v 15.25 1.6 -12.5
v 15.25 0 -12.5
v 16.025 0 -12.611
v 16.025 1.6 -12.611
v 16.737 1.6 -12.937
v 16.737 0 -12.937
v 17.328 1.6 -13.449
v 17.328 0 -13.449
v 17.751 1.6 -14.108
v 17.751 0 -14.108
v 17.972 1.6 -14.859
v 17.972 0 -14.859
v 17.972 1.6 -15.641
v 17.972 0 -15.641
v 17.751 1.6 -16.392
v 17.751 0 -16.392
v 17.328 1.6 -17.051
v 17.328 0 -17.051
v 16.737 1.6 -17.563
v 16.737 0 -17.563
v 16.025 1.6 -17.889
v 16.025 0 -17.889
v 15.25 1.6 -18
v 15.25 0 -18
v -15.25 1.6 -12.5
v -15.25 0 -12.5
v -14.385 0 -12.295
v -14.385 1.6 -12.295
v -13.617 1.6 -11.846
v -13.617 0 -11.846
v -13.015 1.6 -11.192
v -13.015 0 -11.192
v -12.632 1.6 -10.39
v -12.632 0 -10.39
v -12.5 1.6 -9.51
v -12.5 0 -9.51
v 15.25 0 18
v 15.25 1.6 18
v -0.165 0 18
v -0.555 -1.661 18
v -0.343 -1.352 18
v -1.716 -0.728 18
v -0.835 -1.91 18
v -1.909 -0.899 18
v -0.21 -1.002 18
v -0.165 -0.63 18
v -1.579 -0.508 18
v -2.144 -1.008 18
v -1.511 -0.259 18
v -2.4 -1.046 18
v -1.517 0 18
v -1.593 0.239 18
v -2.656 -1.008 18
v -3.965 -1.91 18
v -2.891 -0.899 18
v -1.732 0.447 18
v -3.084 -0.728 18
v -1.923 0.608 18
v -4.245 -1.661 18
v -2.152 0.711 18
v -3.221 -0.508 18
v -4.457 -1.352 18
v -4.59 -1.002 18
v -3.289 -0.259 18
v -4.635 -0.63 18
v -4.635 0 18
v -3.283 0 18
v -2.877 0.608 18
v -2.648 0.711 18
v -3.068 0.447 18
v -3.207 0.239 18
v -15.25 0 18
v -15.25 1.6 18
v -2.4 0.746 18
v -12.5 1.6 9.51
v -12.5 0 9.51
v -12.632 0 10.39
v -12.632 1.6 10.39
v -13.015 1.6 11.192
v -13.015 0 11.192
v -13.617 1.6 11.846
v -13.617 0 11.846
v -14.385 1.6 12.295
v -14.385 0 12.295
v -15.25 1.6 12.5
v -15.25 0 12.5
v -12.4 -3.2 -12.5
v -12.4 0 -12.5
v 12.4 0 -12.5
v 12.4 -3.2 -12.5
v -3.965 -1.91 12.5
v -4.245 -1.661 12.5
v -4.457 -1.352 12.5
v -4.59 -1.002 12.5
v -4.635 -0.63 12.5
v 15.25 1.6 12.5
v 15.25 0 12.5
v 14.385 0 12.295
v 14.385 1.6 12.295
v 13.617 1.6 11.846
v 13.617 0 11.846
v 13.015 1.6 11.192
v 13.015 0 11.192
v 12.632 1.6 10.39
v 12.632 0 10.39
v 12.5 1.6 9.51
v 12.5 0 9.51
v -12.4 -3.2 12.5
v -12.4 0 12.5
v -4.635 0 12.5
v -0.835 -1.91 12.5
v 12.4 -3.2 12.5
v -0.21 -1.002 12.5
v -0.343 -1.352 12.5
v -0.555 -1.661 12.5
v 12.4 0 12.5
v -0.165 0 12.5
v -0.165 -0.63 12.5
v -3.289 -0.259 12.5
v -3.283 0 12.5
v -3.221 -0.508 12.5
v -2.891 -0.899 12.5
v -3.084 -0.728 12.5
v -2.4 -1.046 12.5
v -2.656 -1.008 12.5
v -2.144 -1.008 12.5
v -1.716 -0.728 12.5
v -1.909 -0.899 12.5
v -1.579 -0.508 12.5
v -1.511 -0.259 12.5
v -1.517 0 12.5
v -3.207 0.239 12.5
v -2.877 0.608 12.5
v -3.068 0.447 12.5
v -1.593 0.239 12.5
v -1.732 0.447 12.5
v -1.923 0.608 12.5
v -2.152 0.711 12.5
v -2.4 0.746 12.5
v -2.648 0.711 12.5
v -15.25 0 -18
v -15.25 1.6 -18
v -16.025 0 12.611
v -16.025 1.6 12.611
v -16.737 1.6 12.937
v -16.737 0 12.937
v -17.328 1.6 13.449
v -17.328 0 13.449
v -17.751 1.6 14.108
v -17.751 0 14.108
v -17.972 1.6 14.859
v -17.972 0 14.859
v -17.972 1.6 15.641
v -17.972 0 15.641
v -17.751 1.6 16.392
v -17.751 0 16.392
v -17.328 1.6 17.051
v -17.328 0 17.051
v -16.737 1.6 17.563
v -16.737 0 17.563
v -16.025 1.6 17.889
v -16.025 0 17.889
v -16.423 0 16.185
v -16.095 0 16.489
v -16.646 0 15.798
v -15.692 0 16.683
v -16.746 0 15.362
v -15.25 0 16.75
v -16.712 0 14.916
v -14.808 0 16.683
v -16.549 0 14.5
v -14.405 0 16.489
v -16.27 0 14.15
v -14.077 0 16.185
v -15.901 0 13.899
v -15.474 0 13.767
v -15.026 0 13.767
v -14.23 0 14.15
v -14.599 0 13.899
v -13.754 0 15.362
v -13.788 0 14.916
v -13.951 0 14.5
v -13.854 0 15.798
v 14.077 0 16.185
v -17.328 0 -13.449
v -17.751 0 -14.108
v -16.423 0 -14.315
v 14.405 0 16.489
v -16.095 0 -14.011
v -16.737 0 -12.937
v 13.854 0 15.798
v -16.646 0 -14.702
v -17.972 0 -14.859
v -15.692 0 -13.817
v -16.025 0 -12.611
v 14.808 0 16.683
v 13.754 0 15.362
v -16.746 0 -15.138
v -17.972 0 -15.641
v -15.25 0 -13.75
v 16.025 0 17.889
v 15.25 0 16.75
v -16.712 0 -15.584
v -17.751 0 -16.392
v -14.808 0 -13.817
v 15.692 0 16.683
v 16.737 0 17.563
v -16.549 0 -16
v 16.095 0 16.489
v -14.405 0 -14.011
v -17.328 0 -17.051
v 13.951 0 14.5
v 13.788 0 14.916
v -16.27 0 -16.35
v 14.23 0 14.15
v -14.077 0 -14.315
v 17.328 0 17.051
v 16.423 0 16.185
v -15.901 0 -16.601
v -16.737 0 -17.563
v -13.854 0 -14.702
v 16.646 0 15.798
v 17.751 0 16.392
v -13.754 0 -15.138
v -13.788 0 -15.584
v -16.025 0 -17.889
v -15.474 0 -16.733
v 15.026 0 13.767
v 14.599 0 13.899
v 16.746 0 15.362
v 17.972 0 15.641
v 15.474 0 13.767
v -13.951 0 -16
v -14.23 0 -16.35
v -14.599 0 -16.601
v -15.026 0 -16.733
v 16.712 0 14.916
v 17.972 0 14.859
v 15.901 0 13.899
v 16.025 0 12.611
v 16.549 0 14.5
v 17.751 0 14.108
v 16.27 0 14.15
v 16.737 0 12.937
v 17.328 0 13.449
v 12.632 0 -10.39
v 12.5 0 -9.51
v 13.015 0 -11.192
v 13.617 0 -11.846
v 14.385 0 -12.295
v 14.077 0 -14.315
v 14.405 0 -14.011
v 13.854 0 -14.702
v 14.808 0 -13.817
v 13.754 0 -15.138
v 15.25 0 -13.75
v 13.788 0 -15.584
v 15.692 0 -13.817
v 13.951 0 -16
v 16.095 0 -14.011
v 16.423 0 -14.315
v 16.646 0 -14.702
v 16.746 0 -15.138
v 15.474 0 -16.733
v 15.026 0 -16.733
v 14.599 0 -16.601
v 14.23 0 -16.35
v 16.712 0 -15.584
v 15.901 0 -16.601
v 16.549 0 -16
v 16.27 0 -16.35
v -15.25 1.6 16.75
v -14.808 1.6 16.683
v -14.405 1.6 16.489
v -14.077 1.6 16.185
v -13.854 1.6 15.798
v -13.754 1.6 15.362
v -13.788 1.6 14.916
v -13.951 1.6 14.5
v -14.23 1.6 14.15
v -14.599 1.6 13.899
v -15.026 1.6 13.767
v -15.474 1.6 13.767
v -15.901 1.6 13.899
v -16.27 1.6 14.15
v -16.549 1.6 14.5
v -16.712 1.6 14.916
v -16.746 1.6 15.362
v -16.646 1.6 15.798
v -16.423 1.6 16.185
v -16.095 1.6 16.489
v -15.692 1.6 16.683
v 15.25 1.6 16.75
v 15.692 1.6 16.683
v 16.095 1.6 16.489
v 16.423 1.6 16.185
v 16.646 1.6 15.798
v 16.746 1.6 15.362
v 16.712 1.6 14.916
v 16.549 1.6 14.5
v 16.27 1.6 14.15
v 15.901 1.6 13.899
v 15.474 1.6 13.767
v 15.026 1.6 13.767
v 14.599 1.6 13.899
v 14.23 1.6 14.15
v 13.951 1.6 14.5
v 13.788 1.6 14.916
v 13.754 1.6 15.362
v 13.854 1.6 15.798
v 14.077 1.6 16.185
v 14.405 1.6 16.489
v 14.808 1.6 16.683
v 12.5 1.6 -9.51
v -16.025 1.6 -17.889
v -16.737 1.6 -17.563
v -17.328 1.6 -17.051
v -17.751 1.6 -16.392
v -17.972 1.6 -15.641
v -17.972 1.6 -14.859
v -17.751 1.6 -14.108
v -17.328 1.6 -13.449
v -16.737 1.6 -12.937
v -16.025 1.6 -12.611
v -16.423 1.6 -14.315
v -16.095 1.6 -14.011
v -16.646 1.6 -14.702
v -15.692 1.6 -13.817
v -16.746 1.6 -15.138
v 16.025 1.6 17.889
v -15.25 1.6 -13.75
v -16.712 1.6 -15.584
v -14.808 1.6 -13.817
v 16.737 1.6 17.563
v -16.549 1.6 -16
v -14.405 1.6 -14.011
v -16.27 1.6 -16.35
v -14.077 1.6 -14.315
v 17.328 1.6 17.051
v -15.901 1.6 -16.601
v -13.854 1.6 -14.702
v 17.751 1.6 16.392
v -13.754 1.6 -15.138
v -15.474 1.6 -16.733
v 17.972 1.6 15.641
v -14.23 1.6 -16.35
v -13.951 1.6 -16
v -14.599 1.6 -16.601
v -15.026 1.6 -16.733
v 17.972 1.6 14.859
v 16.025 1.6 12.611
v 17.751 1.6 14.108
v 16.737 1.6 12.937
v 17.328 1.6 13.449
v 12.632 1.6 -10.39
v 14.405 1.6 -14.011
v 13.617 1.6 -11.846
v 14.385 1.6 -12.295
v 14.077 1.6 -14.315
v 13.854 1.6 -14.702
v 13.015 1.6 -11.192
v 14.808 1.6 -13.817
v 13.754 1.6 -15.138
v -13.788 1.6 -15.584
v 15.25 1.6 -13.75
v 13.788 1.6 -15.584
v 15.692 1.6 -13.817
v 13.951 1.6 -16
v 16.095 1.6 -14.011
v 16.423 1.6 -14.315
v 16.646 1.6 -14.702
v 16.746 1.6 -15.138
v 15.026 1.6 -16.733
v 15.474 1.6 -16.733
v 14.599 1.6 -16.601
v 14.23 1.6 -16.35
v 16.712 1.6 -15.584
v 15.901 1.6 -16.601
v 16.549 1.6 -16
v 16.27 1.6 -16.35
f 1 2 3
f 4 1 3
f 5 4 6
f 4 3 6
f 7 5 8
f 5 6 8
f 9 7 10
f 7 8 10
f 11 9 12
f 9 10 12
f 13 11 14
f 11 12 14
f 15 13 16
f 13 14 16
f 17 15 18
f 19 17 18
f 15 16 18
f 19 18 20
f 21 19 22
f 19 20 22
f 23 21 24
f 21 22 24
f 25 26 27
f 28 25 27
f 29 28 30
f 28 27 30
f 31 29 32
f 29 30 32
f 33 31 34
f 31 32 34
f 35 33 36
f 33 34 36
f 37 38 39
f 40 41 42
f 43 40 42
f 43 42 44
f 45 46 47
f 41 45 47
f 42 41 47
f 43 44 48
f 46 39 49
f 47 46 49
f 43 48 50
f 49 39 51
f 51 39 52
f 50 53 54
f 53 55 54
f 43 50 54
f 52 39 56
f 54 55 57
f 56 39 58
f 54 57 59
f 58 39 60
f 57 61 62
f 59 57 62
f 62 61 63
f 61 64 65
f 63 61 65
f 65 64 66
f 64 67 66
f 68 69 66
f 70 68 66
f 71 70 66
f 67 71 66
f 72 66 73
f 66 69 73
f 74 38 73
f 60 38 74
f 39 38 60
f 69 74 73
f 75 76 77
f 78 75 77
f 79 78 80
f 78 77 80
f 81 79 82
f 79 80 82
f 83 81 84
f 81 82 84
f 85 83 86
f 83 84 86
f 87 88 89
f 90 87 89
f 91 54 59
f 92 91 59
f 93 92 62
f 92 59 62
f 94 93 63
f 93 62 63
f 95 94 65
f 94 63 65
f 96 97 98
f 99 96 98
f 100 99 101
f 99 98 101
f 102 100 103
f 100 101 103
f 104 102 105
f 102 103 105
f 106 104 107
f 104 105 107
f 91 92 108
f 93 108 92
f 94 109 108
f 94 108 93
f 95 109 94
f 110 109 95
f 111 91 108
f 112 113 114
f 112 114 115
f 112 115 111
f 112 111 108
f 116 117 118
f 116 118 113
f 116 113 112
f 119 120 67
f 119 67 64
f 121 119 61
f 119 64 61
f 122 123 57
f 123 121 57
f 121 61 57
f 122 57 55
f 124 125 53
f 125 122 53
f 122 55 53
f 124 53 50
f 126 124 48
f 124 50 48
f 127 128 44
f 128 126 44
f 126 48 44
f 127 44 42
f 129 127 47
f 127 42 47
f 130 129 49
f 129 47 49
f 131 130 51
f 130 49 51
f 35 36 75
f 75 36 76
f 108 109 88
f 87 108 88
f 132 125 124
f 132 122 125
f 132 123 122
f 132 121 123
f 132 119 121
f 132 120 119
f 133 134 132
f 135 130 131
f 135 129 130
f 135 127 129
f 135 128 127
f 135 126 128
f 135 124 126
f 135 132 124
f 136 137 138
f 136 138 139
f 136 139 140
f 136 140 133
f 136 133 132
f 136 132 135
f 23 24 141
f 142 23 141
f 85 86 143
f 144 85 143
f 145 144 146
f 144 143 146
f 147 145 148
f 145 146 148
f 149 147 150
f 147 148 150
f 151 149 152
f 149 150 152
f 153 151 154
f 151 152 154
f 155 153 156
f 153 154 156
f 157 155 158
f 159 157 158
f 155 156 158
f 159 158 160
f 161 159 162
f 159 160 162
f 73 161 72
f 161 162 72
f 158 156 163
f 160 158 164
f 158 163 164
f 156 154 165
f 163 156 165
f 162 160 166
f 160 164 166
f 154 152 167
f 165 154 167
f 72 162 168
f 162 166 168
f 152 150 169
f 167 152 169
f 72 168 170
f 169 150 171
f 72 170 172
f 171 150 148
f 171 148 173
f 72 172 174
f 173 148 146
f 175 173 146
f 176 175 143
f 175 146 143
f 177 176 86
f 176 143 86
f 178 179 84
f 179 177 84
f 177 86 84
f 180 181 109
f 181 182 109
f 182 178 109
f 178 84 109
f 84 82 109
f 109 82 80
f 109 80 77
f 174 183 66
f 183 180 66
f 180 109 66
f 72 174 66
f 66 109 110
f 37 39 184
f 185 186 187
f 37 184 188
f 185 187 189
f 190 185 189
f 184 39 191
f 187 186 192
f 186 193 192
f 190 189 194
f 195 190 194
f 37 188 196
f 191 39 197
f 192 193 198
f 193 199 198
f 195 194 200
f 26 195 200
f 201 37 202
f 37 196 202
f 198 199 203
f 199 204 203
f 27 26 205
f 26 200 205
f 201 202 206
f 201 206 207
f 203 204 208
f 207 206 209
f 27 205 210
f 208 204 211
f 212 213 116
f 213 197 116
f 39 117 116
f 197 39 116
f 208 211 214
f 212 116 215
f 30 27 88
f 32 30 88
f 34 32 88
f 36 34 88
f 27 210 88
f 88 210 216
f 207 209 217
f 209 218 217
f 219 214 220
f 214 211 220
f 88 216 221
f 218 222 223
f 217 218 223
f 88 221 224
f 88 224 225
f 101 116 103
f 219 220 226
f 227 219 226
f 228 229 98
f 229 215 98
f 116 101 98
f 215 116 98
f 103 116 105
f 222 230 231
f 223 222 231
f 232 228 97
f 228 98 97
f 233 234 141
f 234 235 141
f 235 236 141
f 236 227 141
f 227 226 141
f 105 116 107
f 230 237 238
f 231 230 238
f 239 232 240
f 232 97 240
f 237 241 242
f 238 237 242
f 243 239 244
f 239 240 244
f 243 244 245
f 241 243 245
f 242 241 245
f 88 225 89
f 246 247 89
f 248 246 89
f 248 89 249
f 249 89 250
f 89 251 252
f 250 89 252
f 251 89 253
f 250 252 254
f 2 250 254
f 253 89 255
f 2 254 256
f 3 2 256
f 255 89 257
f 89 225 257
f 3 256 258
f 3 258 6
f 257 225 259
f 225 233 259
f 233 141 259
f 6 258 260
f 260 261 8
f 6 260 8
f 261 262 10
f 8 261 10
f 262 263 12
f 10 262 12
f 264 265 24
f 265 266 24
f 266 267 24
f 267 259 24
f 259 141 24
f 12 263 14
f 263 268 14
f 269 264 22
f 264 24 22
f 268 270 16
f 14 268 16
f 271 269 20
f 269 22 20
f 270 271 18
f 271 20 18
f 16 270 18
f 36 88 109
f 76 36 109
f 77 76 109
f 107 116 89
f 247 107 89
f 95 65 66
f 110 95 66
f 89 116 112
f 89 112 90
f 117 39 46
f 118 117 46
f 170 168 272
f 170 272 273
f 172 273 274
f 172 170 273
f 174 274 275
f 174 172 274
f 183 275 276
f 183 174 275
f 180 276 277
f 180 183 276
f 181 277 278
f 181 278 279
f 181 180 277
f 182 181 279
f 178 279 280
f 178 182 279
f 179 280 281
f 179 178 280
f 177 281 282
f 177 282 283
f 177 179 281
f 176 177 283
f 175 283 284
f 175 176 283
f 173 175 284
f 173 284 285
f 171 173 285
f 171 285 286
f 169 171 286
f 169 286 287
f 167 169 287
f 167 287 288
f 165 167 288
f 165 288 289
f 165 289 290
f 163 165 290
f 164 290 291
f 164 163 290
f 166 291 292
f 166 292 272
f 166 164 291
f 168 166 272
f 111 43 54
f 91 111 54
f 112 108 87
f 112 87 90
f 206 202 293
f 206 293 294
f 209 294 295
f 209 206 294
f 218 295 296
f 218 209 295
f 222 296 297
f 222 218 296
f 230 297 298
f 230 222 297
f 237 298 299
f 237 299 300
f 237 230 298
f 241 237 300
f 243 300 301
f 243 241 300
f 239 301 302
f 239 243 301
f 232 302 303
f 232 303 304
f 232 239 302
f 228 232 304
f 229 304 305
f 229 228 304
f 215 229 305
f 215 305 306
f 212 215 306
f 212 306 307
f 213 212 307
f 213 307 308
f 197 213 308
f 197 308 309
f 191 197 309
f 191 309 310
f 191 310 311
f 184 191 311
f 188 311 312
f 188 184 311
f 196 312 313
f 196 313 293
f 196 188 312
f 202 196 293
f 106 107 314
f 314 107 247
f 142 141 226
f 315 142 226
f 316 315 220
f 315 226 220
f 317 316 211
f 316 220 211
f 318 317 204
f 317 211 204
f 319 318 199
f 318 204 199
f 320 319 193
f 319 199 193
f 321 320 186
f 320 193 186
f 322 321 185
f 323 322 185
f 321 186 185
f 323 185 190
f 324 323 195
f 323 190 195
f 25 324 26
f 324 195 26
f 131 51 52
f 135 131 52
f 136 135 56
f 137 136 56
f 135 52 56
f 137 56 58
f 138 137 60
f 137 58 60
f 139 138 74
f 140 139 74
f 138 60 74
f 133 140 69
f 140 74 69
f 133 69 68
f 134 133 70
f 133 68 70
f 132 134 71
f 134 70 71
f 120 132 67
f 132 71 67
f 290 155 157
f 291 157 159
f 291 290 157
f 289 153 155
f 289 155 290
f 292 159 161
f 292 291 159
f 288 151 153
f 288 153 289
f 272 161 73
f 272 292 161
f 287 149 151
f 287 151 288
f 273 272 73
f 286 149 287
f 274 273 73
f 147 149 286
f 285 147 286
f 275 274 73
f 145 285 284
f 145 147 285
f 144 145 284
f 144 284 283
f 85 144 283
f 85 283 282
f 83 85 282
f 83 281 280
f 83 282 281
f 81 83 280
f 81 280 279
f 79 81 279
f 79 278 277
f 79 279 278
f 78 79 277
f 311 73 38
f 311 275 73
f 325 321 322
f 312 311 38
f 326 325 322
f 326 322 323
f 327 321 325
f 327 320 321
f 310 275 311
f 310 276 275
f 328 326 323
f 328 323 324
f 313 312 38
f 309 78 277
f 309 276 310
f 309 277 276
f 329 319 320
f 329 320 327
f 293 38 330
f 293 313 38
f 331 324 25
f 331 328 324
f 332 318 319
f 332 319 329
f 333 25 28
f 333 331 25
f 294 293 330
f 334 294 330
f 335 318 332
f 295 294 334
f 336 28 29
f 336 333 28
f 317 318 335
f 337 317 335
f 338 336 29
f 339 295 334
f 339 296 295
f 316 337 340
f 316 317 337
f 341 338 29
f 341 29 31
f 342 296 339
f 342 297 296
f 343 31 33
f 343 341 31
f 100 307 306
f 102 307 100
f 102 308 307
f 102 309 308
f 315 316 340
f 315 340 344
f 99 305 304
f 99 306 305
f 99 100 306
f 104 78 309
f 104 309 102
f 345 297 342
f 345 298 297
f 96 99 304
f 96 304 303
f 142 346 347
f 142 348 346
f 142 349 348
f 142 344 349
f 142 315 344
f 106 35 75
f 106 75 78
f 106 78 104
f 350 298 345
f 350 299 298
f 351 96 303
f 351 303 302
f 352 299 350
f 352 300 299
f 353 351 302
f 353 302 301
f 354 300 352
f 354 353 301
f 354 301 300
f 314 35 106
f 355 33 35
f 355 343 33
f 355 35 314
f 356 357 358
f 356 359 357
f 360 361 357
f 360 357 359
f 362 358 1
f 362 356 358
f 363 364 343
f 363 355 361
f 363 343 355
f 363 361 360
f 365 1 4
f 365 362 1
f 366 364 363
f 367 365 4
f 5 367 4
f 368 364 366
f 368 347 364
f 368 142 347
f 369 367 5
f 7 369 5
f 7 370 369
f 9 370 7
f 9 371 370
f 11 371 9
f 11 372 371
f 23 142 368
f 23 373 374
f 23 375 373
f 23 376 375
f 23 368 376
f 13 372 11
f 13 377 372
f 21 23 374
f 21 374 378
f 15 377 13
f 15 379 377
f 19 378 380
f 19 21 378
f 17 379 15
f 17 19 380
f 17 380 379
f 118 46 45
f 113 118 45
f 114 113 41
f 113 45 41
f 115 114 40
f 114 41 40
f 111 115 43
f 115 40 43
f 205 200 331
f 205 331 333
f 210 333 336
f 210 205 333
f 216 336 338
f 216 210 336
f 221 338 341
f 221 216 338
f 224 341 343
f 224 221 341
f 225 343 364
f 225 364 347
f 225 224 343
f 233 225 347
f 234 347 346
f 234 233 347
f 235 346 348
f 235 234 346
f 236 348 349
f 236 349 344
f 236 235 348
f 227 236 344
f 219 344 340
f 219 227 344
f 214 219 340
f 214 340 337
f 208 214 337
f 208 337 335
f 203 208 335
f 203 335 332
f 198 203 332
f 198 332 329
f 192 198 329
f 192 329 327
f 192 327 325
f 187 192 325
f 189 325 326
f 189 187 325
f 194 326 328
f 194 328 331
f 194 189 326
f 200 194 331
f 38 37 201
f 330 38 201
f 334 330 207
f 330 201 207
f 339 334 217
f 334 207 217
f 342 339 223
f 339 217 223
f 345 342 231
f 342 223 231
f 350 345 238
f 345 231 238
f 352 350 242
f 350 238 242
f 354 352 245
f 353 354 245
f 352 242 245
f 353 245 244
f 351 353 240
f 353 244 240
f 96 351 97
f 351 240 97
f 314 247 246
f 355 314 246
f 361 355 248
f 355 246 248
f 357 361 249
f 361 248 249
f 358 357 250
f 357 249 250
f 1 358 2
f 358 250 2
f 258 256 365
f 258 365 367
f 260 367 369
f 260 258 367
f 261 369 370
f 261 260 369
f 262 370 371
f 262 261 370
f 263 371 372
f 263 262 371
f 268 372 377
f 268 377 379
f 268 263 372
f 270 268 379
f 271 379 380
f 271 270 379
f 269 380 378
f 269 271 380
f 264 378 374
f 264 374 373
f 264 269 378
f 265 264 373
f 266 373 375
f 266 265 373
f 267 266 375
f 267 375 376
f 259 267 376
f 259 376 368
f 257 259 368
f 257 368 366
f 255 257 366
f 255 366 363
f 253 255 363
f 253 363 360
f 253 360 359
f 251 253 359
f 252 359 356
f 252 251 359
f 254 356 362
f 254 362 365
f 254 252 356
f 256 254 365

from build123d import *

# Parameters (mm, degrees)
SKETCH1_R           = 1.5
BOSS_EXTRUDE1_DEPTH = 1.6
SKETCH1_3_W         = 24.8
SKETCH1_3_H         = 25
BOSS_EXTRUDE2_DEPTH = 3.2
SKETCH2_R           = 0.895817692
BOSS_EXTRUDE3_DEPTH = 5.5
CUT_EXTRUDE1_DEPTH  = 5.5


with BuildPart() as part:
    # Sketch1 → Boss-Extrude1 (new body)
    with BuildSketch(Plane(origin=(0, 0, 0), x_dir=(1, 0, 0), z_dir=(0, 1, 0))):
        with BuildLine():
            Line((-12.5, 9.510434814), (-12.5, -9.510434814))
            ThreePointArc((-12.5, -9.510434814), (-13.292059783, -11.541444415), (-15.25, -12.5))
            ThreePointArc((-15.25, -12.5), (-18, -15.25), (-15.25, -18))
            Line((-15.25, -18), (15.25, -18))
            ThreePointArc((15.25, -18), (18, -15.25), (15.25, -12.5))
            ThreePointArc((15.25, -12.5), (13.292059783, -11.541444415), (12.5, -9.510434814))
            Line((12.5, -9.510434814), (12.5, 9.510434814))
            ThreePointArc((12.5, 9.510434814), (13.292059783, 11.541444415), (15.25, 12.5))
            ThreePointArc((15.25, 12.5), (18, 15.25), (15.25, 18))
            Line((15.25, 18), (-15.25, 18))
            ThreePointArc((-15.25, 18), (-18, 15.25), (-15.25, 12.5))
            ThreePointArc((-15.25, 12.5), (-13.292059783, 11.541444415), (-12.5, 9.510434814))
        make_face()
        with Locations(Location((-15.25, -15.25, 0), (0, 0, 270))):
            Circle(SKETCH1_R, mode=Mode.SUBTRACT)
        with Locations(Location((-15.25, 15.25, 0), (0, 0, 270))):
            Circle(SKETCH1_R, mode=Mode.SUBTRACT)
        with Locations(Location((15.25, -15.25, 0), (0, 0, 270))):
            Circle(SKETCH1_R, mode=Mode.SUBTRACT)
        with Locations(Location((15.25, 15.25, 0), (0, 0, 270))):
            Circle(SKETCH1_R, mode=Mode.SUBTRACT)
    extrude(amount=BOSS_EXTRUDE1_DEPTH)

    # Sketch1<3> → Boss-Extrude2 (add)
    with BuildSketch(Plane(origin=(0, 0, 0), x_dir=(1, 0, 0), z_dir=(0, 1, 0))):
        Rectangle(SKETCH1_3_W, SKETCH1_3_H)
    extrude(amount=-BOSS_EXTRUDE2_DEPTH)

    # Sketch2 → Boss-Extrude3 (add)
    with BuildSketch(Plane.XY.offset(18)):
        with BuildLine():
            Line((-4.635, 0), (-4.1, 0))
            Line((-4.1, 0), (-4.1, 1.6))
            Line((-4.1, 1.6), (-0.7, 1.6))
            Line((-0.7, 1.6), (-0.7, 0))
            Line((-0.7, 0), (-0.165, 0))
            Line((-0.165, 0), (-0.165, -0.630150614))
            ThreePointArc((-0.165, -0.630150614), (-0.342571379, -1.352412026), (-0.834799774, -1.91))
            Line((-0.834799774, -1.91), (-3.965200226, -1.91))
            ThreePointArc((-3.965200226, -1.91), (-4.457428621, -1.352412026), (-4.635, -0.630150614))
            Line((-4.635, -0.630150614), (-4.635, 0))
        make_face()
        with Locations((-2.4, -0.15)):
            Circle(SKETCH2_R, mode=Mode.SUBTRACT)
    extrude(amount=-BOSS_EXTRUDE3_DEPTH)

    # Sketch2<2> → Cut-Extrude1 (cut)
    with BuildSketch(Plane.XY.offset(18)):
        with BuildLine():
            Line((-1.51682995, 0), (-3.28317005, 0))
            ThreePointArc((-3.28317005, 0), (-2.475266133, -1.042650182), (-1.504182308, -0.15))
            ThreePointArc((-1.504182308, -0.15), (-1.507349818, -0.074733867), (-1.51682995, 0))
        make_face()
        with BuildLine():
            ThreePointArc((-1.51682995, 0), (-2.4, 0.745817692), (-3.28317005, 0))
            Line((-3.28317005, 0), (-1.51682995, 0))
        make_face()
    extrude(amount=-CUT_EXTRUDE1_DEPTH, mode=Mode.SUBTRACT)


solid = part.part
